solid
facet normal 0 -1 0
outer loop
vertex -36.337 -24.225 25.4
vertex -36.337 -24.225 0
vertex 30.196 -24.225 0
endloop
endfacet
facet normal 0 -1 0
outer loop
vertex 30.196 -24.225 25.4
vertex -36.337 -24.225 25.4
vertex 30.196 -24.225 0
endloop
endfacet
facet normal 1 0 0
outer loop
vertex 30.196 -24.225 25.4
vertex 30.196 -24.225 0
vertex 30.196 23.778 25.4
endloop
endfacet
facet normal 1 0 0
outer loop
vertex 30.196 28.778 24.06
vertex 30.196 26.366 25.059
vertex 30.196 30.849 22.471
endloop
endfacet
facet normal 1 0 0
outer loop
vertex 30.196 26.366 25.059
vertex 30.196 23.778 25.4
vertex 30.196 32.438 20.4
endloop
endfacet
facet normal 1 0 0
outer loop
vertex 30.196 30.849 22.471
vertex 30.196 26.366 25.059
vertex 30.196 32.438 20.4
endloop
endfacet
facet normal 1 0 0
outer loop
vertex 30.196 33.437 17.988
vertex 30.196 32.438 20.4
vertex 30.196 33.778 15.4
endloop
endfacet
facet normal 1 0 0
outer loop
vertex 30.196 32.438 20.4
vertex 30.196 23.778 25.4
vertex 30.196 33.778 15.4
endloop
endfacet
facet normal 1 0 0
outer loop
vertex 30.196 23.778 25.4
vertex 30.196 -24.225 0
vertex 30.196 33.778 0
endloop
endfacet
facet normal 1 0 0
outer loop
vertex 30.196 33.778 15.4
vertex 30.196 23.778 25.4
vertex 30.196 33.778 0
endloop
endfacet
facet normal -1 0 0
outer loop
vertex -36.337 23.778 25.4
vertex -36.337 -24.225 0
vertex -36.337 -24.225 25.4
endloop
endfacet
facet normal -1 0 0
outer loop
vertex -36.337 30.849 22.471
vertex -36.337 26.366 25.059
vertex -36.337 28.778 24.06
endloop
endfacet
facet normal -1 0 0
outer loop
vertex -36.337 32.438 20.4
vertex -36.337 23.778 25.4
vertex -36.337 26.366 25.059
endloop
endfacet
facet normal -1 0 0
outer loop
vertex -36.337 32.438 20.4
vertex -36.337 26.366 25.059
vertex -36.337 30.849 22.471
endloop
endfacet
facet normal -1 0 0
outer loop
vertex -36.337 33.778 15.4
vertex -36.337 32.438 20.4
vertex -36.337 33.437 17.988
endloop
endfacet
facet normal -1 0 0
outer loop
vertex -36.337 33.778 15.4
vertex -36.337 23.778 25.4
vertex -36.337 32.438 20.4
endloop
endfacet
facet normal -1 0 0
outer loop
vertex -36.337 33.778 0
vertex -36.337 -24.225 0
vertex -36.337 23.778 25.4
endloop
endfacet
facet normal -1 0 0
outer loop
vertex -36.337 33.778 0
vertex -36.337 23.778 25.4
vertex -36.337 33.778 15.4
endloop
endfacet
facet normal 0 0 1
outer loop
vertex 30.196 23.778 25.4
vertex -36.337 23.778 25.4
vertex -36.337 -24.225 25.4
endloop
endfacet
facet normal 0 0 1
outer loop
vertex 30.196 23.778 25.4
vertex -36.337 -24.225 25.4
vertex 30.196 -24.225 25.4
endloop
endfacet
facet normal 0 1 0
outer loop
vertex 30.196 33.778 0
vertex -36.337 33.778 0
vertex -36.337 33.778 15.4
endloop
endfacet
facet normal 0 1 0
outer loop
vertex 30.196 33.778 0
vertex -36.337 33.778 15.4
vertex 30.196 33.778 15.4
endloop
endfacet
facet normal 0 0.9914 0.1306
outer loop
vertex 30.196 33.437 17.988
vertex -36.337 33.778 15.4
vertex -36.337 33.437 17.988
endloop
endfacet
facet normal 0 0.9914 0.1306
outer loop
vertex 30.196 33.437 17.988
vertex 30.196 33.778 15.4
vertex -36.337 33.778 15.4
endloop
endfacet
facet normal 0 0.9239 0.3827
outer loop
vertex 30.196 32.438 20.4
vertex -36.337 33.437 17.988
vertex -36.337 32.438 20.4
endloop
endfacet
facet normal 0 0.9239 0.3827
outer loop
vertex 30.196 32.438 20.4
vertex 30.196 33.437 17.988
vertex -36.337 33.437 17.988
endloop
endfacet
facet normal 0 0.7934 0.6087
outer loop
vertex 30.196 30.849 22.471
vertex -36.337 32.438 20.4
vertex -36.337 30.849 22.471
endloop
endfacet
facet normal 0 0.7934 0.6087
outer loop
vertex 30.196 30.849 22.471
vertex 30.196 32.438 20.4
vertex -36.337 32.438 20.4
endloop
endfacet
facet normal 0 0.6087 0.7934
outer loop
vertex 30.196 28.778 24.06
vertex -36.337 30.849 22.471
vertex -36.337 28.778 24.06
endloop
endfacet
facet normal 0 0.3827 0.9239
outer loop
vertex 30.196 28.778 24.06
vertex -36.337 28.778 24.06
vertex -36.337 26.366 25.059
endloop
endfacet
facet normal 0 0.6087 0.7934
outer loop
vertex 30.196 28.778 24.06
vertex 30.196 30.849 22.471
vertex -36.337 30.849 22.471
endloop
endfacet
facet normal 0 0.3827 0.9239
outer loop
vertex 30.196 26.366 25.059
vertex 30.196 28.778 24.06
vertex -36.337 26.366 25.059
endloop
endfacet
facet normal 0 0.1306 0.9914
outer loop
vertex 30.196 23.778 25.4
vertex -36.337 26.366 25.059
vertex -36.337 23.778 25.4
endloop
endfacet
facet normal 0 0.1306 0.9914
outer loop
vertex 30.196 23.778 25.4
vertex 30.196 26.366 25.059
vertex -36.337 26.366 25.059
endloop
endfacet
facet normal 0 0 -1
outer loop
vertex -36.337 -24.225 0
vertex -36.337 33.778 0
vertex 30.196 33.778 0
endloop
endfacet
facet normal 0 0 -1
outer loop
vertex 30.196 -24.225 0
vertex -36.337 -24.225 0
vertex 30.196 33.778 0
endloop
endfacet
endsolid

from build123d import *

# Parameters (mm, degrees)
F0_W     = 66.532835
F0_H     = 58.002986
F1_DEPTH = 25.4
F2_R     = 10


with BuildPart() as f1:
    # F0 (on Top) → F1 (new body)
    with BuildSketch(Plane.XY):
        with Locations((-3.070745, 4.776716)):
            Rectangle(F0_W, F0_H)
    extrude(amount=F1_DEPTH)

    # F2
    f2_edges = [f1.edges().sort_by_distance(p)[0] for p in [
        (-3.070746, 33.778209, 25.4),
    ]]
    fillet(f2_edges, radius=F2_R)


solid = f1.part
